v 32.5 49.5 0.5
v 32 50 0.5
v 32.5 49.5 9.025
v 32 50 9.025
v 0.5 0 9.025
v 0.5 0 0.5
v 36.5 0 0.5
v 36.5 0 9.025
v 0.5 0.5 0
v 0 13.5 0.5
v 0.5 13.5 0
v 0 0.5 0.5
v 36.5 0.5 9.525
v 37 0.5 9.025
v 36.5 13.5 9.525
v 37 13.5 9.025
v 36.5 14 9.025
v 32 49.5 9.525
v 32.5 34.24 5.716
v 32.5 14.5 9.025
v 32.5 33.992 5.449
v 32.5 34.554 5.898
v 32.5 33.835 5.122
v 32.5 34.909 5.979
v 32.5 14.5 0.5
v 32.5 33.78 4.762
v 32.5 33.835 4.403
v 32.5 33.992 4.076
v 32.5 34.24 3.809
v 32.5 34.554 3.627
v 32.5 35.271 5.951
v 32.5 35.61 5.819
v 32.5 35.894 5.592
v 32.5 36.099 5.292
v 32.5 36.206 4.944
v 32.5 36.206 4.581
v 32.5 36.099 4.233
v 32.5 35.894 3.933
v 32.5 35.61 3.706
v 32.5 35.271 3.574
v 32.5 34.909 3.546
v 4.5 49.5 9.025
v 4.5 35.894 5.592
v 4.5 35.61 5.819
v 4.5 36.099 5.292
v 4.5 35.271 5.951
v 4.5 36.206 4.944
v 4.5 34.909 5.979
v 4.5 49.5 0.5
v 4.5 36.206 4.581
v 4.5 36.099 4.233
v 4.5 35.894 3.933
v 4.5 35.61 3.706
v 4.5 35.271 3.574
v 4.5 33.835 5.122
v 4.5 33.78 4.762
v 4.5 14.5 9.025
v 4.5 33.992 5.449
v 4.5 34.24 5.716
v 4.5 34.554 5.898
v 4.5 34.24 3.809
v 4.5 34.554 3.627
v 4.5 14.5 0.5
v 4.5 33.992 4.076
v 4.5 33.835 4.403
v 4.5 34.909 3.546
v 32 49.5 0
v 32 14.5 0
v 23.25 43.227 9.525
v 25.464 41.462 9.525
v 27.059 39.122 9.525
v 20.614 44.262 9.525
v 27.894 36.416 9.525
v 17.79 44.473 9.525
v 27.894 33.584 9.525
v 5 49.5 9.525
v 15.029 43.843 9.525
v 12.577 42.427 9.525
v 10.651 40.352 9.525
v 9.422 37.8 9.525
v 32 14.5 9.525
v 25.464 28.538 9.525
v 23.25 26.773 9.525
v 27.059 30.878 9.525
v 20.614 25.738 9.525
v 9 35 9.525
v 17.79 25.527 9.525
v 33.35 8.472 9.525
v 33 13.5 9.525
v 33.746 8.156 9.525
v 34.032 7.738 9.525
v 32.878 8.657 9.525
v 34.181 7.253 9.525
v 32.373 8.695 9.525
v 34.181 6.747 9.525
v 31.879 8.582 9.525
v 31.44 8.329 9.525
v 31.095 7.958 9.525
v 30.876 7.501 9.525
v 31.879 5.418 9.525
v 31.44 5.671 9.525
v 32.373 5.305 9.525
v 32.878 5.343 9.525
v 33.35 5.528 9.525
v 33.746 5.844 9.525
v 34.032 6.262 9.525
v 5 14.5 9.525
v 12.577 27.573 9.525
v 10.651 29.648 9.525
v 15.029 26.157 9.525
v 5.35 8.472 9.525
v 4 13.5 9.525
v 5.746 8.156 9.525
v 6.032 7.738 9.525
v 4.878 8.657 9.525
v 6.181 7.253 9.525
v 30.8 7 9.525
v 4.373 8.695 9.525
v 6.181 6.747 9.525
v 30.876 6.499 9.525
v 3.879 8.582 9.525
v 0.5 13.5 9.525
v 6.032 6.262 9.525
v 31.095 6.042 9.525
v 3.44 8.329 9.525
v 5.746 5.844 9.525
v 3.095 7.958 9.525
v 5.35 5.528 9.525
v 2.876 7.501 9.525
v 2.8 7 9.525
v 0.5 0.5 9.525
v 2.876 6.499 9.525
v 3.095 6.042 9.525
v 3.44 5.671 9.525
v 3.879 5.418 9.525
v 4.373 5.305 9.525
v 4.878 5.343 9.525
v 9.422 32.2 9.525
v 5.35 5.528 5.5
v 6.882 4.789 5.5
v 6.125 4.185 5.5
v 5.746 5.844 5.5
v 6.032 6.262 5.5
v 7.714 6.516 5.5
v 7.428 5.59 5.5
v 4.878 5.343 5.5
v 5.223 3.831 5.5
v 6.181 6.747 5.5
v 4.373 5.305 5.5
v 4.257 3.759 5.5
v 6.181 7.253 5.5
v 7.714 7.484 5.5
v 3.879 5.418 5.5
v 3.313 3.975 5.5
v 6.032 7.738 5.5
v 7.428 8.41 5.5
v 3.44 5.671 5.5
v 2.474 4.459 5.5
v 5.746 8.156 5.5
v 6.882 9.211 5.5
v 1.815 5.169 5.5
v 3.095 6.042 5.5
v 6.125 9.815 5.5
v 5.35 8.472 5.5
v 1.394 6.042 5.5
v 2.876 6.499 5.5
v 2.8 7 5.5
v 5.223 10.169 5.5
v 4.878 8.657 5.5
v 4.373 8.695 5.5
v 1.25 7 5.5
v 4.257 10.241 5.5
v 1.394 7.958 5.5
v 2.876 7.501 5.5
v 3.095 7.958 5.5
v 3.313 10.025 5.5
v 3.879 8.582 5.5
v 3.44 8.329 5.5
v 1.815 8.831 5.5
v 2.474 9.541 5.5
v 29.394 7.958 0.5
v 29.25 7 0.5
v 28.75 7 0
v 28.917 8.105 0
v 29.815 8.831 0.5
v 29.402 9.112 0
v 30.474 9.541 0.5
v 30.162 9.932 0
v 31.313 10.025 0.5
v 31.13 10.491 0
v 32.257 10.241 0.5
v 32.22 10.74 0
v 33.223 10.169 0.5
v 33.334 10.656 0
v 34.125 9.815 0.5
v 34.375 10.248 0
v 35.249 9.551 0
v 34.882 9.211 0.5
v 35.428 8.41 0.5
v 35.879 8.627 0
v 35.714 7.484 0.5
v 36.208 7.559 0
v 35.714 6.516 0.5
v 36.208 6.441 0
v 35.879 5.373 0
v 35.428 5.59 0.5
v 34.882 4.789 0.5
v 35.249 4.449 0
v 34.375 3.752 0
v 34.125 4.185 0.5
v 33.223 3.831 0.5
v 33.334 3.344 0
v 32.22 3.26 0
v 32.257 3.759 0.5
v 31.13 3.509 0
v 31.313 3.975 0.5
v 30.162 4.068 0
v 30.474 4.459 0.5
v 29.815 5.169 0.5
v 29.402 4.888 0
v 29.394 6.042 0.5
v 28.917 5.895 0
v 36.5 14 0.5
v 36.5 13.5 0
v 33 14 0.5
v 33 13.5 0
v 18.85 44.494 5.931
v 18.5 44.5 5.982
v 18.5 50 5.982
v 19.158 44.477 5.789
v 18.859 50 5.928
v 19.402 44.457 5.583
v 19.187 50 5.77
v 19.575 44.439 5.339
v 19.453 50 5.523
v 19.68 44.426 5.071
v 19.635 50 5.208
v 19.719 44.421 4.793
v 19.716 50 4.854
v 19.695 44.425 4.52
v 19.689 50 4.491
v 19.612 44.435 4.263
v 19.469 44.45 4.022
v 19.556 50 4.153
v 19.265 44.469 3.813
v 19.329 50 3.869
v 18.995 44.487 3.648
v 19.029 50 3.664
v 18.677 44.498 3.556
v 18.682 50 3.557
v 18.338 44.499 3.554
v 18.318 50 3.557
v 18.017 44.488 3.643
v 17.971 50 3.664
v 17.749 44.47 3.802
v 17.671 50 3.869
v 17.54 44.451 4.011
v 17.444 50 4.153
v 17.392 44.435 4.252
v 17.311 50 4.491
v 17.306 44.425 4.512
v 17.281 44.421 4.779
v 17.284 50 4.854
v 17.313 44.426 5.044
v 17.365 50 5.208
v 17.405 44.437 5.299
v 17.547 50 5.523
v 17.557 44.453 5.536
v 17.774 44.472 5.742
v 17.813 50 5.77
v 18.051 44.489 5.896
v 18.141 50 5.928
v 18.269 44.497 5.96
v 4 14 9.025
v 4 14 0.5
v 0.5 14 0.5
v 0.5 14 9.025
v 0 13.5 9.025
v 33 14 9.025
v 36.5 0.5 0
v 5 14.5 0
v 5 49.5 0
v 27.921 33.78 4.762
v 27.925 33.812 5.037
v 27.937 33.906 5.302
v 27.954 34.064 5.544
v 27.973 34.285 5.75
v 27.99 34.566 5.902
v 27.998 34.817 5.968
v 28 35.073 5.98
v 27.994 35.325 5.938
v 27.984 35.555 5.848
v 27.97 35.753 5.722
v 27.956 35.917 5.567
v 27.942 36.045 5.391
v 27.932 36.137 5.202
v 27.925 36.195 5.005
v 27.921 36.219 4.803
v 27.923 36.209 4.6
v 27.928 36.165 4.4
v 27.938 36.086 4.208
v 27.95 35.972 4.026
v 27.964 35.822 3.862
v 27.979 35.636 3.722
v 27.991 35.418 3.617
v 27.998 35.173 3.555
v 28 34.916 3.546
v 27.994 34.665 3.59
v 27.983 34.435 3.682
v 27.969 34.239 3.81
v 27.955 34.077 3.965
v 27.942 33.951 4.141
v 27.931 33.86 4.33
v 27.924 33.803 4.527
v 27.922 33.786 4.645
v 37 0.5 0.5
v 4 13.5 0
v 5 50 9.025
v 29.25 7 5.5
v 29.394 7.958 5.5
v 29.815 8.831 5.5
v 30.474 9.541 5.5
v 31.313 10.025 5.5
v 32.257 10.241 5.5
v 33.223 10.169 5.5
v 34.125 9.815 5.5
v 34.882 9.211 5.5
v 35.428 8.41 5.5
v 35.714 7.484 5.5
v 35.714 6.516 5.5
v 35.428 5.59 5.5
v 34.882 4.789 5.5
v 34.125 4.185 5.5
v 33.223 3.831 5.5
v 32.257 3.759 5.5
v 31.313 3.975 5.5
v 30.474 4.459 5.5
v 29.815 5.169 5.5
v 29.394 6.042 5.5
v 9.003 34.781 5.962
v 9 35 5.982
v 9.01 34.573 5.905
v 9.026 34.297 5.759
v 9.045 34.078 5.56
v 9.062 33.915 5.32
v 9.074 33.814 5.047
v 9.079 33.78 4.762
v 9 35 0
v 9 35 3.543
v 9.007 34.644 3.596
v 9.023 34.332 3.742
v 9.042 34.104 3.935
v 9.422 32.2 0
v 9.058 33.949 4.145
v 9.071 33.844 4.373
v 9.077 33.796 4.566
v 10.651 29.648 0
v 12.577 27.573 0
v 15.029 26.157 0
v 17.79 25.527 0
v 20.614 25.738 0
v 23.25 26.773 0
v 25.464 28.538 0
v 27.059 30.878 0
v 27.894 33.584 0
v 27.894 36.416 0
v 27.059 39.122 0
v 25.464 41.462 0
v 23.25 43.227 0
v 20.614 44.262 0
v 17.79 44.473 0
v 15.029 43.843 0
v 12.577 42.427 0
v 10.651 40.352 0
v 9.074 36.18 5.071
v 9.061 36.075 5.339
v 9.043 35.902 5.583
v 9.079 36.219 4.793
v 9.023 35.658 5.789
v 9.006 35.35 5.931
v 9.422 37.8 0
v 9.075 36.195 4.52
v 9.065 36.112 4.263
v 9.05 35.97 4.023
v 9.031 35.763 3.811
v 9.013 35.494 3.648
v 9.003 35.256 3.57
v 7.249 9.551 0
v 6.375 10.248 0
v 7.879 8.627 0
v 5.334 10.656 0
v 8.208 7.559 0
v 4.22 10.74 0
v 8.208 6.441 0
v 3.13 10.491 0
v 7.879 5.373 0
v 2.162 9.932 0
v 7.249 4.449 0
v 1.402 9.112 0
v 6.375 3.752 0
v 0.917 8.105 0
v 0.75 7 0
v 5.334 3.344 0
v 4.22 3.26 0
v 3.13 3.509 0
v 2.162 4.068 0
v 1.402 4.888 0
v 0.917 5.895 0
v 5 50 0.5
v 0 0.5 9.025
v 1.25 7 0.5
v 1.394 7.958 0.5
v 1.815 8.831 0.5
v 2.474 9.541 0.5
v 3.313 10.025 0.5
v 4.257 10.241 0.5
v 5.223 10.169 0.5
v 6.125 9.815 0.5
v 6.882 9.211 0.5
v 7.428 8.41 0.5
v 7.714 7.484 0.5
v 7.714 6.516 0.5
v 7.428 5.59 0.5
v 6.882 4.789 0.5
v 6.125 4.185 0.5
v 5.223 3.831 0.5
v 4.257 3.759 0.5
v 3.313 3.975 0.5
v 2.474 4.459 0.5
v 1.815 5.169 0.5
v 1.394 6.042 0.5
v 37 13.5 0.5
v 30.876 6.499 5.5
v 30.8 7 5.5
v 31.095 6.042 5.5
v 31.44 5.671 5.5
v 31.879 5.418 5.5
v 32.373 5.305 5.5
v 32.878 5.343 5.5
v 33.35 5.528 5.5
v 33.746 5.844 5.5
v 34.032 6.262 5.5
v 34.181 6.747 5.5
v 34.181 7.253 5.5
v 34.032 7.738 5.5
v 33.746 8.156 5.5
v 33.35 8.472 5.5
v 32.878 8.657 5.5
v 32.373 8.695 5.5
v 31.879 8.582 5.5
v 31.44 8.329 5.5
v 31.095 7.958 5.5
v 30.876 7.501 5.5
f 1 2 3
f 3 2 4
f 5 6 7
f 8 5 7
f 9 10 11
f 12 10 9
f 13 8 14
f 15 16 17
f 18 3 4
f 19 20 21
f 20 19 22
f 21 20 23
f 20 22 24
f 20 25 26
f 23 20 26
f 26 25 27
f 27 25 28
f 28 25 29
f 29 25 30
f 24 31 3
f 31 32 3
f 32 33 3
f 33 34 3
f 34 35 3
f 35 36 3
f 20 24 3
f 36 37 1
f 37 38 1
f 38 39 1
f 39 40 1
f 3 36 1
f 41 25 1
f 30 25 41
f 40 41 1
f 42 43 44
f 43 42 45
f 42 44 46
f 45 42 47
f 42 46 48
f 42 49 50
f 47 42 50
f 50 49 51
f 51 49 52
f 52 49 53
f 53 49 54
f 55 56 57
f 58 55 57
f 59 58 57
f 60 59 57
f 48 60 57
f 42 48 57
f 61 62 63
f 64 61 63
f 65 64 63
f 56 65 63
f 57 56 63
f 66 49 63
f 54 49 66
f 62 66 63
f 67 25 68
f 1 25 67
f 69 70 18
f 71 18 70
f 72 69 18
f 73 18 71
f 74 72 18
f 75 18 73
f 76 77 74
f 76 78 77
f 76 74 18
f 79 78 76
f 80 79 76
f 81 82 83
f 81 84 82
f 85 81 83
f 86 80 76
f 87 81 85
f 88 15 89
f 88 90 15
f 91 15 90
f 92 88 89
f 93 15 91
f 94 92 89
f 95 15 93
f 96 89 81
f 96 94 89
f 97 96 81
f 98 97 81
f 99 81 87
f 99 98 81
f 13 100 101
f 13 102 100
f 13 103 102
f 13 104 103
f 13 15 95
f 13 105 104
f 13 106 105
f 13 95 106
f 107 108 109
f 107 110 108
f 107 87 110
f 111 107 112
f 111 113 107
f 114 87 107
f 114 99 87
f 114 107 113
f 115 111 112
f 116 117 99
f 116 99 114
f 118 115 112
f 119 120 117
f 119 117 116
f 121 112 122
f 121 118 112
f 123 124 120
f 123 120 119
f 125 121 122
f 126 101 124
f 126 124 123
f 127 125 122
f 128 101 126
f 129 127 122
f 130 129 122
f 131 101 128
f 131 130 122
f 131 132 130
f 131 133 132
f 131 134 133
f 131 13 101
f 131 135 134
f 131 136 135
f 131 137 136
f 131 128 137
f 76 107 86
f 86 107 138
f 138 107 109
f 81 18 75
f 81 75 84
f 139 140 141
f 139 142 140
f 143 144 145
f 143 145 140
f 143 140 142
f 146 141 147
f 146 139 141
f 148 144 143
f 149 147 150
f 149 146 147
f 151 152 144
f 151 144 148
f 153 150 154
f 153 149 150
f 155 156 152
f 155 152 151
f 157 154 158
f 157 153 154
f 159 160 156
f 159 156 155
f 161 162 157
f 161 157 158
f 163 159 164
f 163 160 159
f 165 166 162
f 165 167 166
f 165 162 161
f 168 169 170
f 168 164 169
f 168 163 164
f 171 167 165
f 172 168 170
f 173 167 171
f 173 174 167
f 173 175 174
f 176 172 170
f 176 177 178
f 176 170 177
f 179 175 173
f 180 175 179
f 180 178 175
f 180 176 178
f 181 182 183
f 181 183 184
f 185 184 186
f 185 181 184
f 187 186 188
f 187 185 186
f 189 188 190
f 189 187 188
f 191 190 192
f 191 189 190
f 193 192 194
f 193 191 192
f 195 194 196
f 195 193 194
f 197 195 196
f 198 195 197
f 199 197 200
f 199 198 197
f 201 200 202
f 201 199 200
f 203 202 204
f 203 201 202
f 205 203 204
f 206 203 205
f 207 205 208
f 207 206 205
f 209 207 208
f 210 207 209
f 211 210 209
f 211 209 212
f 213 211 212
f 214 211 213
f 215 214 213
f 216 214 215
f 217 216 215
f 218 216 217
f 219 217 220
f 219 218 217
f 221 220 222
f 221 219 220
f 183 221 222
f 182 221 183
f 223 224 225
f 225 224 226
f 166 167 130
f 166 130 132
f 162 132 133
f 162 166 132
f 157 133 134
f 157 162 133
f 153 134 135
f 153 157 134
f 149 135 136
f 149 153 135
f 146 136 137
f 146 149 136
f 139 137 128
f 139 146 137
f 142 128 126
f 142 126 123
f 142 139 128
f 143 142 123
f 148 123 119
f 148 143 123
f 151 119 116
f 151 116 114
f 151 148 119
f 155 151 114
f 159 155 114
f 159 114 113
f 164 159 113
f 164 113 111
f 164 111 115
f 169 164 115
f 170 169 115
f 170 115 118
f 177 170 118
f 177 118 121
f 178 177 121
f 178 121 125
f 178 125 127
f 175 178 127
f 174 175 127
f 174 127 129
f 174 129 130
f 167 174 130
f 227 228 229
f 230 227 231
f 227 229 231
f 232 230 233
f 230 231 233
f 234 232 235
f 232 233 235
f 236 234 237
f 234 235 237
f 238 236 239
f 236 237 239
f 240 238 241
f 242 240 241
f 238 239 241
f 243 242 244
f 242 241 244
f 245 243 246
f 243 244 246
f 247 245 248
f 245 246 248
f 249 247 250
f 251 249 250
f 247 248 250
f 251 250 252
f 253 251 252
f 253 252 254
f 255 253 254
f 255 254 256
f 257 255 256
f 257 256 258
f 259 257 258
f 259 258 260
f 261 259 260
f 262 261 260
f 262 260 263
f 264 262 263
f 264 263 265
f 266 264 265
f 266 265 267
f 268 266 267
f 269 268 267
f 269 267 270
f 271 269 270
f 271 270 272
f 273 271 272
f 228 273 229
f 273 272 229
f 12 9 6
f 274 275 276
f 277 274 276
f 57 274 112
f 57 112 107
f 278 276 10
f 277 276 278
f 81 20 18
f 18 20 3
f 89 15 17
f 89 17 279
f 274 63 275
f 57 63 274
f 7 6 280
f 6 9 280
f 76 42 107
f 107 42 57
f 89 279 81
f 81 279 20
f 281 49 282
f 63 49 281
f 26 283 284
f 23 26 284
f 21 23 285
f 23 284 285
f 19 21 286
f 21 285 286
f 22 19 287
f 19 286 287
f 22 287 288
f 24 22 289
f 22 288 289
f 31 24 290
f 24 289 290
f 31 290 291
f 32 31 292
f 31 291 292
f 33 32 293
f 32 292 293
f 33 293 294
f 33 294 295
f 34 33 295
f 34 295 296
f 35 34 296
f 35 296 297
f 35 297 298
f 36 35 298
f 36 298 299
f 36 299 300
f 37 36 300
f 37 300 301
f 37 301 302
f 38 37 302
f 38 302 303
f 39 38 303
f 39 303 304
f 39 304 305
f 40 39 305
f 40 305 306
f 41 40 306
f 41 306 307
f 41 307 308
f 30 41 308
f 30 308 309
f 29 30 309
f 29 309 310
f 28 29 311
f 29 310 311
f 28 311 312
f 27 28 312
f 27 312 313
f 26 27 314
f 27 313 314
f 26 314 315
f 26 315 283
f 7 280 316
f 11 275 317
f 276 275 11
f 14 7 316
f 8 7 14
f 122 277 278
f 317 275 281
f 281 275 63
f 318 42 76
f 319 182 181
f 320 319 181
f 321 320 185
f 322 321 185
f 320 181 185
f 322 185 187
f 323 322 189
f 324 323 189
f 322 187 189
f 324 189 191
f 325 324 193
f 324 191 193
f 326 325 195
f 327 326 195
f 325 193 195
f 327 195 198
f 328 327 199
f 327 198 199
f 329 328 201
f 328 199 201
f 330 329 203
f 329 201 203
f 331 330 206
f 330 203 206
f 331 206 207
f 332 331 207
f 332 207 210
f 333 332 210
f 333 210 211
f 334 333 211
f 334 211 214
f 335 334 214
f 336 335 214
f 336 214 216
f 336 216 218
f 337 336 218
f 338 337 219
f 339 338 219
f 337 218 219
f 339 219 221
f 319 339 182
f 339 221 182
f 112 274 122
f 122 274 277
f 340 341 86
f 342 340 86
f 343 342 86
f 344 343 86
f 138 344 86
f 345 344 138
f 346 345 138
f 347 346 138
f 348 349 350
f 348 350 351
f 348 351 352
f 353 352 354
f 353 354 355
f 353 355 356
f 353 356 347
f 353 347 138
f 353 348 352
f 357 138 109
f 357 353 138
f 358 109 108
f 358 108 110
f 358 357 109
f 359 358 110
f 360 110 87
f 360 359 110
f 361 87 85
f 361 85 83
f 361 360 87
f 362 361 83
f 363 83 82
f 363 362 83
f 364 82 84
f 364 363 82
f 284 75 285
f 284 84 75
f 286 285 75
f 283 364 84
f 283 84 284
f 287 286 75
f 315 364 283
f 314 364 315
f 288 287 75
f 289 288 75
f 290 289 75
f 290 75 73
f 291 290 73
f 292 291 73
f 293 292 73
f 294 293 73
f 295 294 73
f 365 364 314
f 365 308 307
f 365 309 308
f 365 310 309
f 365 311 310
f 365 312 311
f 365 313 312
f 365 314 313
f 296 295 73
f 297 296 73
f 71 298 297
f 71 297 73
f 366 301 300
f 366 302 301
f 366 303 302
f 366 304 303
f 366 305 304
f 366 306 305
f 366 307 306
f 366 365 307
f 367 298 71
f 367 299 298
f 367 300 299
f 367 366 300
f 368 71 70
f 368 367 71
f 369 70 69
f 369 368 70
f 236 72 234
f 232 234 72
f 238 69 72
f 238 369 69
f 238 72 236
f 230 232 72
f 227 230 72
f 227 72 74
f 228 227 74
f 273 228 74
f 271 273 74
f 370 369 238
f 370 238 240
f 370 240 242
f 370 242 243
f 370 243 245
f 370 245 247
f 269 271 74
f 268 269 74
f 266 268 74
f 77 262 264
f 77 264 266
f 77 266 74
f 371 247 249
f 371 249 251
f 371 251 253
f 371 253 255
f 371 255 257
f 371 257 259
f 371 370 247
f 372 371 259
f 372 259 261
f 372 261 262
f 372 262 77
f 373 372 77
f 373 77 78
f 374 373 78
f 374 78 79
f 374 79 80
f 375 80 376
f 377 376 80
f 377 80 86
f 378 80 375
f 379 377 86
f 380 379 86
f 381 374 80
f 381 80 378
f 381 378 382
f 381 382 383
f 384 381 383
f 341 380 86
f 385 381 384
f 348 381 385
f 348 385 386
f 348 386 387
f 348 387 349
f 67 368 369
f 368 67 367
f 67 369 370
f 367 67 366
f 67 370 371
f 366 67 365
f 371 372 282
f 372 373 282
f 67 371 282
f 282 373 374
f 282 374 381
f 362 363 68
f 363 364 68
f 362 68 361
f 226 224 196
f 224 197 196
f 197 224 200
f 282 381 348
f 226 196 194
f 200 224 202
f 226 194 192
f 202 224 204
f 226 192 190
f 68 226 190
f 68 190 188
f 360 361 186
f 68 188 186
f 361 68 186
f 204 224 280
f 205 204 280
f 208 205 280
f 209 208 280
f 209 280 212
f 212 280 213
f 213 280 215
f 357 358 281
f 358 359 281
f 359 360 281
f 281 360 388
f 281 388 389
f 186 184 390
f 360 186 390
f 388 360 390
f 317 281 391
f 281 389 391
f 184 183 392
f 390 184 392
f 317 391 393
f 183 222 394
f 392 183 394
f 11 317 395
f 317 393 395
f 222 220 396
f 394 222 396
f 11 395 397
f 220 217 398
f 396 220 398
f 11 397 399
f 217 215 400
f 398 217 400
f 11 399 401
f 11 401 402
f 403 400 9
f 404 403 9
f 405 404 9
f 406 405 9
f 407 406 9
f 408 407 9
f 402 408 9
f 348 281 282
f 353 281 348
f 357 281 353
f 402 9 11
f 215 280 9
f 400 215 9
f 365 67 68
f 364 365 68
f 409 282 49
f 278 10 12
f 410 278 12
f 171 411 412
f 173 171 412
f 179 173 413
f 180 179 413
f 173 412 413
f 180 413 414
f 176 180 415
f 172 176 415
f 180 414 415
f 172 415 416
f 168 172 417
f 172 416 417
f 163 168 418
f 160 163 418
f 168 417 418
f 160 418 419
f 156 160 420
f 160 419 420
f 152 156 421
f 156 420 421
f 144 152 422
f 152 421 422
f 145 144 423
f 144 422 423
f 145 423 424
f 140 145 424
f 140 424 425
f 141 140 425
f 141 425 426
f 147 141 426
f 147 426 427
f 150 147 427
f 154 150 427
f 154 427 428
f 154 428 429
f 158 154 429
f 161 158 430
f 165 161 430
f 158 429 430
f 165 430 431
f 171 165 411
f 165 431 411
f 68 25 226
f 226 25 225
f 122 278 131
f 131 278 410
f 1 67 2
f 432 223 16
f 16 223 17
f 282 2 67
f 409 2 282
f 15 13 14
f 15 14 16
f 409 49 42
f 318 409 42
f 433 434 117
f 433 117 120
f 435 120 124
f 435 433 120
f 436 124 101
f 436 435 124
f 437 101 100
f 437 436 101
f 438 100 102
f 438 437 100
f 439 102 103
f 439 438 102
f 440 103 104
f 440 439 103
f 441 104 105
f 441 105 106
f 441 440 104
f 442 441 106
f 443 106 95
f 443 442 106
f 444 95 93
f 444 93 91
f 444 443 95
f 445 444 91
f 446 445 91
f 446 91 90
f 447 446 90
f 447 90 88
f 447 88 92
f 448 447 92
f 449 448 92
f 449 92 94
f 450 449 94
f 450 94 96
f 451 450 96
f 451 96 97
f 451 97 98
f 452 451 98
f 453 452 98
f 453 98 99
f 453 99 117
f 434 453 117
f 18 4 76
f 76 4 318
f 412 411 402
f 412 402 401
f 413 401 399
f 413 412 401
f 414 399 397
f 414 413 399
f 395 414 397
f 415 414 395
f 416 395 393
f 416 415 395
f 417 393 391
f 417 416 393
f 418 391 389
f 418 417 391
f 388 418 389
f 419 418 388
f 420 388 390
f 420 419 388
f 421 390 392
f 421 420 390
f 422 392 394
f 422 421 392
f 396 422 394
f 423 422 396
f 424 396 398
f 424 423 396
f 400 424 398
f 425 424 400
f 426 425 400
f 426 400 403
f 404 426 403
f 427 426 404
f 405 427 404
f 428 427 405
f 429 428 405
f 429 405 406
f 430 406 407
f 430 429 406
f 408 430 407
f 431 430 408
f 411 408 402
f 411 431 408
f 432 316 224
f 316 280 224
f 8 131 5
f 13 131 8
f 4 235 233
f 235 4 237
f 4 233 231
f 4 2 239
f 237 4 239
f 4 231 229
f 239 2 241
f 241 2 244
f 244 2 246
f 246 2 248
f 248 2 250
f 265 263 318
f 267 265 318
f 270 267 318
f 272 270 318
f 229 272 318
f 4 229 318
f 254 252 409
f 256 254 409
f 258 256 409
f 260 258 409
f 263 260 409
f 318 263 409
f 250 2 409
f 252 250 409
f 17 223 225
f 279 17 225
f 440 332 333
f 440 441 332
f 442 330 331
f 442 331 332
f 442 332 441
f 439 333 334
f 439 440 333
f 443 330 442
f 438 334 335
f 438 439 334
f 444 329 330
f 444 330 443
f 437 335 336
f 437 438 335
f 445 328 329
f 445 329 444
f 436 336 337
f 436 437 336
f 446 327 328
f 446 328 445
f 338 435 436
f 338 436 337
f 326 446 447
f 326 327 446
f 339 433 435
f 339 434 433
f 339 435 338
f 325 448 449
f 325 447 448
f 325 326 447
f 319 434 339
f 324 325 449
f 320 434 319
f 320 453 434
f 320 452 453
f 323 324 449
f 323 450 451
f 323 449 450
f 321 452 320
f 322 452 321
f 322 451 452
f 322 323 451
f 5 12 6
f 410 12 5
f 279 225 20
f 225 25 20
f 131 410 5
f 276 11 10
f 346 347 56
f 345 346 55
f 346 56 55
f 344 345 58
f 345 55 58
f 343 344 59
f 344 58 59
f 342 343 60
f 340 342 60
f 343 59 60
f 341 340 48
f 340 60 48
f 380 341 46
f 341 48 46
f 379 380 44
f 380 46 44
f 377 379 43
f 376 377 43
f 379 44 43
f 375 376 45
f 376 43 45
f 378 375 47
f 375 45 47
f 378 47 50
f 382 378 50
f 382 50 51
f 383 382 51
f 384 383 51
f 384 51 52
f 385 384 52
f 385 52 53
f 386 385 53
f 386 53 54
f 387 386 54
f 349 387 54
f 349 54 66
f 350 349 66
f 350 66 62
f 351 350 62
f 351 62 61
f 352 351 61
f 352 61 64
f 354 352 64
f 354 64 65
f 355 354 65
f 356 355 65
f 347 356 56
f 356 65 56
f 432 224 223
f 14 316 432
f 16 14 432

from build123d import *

# Parameters (mm, degrees)
SKETCH1_R               = 9.5
SKETCH1_R_2             = 1.7
BOSS_EXTRUDE1_DEPTH     = 9.525
SKETCH2_R               = 3.25
CUT_EXTRUDE1_DEPTH      = 5.5
SKETCH3_R               = 1.2195
CUT_EXTRUDE2_DEPTH      = 61.390194775
CUT_EXTRUDE3_REACH      = 64.926
CUT_EXTRUDE3_END_RADIUS = 9.5
SKETCH4_R               = 1.2195
CHAMFER1_SIZE           = 0.5


with BuildPart() as part:
    # Sketch1 → Boss-Extrude1 (new body)
    with BuildSketch(Plane(origin=(0, 0, 0), x_dir=(-1, 0, 0), z_dir=(0, 0, 1))):
        Polygon((-37, 0), (-37, -14), (-32.5, -14), (-32.5, -50), (-4.5, -50), (-4.5, -14), (0, -14), (0, 0), align=None)
        with Locations((-18.5, -35)):
            Circle(SKETCH1_R, mode=Mode.SUBTRACT)
        with Locations((-32.5, -7)):
            Circle(SKETCH1_R_2, mode=Mode.SUBTRACT)
        with Locations((-4.5, -7)):
            Circle(SKETCH1_R_2, mode=Mode.SUBTRACT)
    extrude(amount=BOSS_EXTRUDE1_DEPTH)

    # Sketch2 → Cut-Extrude1 (cut)
    with BuildSketch(Plane(origin=(0, 0, 0), x_dir=(-1, 0, 0), z_dir=(0, 0, -1))):
        with Locations((-32.5, 7)):
            Circle(SKETCH2_R)
        with Locations((-4.5, 7)):
            Circle(SKETCH2_R)
    extrude(amount=-CUT_EXTRUDE1_DEPTH, mode=Mode.SUBTRACT)

    # Sketch3 → Cut-Extrude2 (cut, through all)
    with BuildSketch(Plane.ZY.offset(-4.5)):
        with Locations(Location((4.7625, 35, 0), (0, 0, 270))):
            Circle(SKETCH3_R)
    extrude(amount=-CUT_EXTRUDE2_DEPTH, mode=Mode.SUBTRACT)

    # Cut-Extrude3: up to this cylinder (the profile starts outside it)
    cut_extrude3_end = Plane(origin=(18.5, 35, 4.7625), z_dir=(0, 0, -1)) * Cylinder(CUT_EXTRUDE3_END_RADIUS, 149.852, mode=Mode.PRIVATE)
    # Sketch4 → Cut-Extrude3 (cut, up to the surface)
    with BuildSketch(Plane(origin=(0, 50, 0), x_dir=(1, 0, 0), z_dir=(0, 1, 0)), mode=Mode.PRIVATE) as cut_extrude3_sk1:
        with Locations(Location((18.5, -4.7625, 0), (0, 0, 270))):
            Circle(SKETCH4_R)
    cut_extrude3_tool1 = extrude(cut_extrude3_sk1.sketch, amount=-CUT_EXTRUDE3_REACH, mode=Mode.PRIVATE) - cut_extrude3_end
    add(cut_extrude3_tool1.solids().sort_by_distance((18.5, 50, 4.7625))[0], mode=Mode.SUBTRACT)

    # Chamfer1
    chamfer1_edges = [part.edges().sort_by_distance(p)[0] for p in [
        (18.5, 50, 0),
        (32.5, 32, 0),
        (34.75, 14, 0),
        (37, 7, 0),
        (18.5, 0, 0),
        (0, 7, 0),
        (2.25, 14, 0),
        (4.5, 32, 0),
        (4.5, 32, 9.525),
        (4.5, 50, 4.7625),
        (32.5, 50, 4.7625),
        (32.5, 14, 4.7625),
        (37, 14, 4.7625),
        (37, 0, 4.7625),
        (0, 0, 4.7625),
        (0, 14, 4.7625),
        (4.5, 14, 4.7625),
        (2.25, 14, 9.525),
        (0, 7, 9.525),
        (18.5, 0, 9.525),
        (37, 7, 9.525),
        (35.75, 7, 0),
        (34.75, 14, 9.525),
        (7.75, 7, 0),
        (32.5, 32, 9.525),
        (18.5, 50, 9.525),
    ]]
    chamfer(chamfer1_edges, length=CHAMFER1_SIZE)


solid = part.part
